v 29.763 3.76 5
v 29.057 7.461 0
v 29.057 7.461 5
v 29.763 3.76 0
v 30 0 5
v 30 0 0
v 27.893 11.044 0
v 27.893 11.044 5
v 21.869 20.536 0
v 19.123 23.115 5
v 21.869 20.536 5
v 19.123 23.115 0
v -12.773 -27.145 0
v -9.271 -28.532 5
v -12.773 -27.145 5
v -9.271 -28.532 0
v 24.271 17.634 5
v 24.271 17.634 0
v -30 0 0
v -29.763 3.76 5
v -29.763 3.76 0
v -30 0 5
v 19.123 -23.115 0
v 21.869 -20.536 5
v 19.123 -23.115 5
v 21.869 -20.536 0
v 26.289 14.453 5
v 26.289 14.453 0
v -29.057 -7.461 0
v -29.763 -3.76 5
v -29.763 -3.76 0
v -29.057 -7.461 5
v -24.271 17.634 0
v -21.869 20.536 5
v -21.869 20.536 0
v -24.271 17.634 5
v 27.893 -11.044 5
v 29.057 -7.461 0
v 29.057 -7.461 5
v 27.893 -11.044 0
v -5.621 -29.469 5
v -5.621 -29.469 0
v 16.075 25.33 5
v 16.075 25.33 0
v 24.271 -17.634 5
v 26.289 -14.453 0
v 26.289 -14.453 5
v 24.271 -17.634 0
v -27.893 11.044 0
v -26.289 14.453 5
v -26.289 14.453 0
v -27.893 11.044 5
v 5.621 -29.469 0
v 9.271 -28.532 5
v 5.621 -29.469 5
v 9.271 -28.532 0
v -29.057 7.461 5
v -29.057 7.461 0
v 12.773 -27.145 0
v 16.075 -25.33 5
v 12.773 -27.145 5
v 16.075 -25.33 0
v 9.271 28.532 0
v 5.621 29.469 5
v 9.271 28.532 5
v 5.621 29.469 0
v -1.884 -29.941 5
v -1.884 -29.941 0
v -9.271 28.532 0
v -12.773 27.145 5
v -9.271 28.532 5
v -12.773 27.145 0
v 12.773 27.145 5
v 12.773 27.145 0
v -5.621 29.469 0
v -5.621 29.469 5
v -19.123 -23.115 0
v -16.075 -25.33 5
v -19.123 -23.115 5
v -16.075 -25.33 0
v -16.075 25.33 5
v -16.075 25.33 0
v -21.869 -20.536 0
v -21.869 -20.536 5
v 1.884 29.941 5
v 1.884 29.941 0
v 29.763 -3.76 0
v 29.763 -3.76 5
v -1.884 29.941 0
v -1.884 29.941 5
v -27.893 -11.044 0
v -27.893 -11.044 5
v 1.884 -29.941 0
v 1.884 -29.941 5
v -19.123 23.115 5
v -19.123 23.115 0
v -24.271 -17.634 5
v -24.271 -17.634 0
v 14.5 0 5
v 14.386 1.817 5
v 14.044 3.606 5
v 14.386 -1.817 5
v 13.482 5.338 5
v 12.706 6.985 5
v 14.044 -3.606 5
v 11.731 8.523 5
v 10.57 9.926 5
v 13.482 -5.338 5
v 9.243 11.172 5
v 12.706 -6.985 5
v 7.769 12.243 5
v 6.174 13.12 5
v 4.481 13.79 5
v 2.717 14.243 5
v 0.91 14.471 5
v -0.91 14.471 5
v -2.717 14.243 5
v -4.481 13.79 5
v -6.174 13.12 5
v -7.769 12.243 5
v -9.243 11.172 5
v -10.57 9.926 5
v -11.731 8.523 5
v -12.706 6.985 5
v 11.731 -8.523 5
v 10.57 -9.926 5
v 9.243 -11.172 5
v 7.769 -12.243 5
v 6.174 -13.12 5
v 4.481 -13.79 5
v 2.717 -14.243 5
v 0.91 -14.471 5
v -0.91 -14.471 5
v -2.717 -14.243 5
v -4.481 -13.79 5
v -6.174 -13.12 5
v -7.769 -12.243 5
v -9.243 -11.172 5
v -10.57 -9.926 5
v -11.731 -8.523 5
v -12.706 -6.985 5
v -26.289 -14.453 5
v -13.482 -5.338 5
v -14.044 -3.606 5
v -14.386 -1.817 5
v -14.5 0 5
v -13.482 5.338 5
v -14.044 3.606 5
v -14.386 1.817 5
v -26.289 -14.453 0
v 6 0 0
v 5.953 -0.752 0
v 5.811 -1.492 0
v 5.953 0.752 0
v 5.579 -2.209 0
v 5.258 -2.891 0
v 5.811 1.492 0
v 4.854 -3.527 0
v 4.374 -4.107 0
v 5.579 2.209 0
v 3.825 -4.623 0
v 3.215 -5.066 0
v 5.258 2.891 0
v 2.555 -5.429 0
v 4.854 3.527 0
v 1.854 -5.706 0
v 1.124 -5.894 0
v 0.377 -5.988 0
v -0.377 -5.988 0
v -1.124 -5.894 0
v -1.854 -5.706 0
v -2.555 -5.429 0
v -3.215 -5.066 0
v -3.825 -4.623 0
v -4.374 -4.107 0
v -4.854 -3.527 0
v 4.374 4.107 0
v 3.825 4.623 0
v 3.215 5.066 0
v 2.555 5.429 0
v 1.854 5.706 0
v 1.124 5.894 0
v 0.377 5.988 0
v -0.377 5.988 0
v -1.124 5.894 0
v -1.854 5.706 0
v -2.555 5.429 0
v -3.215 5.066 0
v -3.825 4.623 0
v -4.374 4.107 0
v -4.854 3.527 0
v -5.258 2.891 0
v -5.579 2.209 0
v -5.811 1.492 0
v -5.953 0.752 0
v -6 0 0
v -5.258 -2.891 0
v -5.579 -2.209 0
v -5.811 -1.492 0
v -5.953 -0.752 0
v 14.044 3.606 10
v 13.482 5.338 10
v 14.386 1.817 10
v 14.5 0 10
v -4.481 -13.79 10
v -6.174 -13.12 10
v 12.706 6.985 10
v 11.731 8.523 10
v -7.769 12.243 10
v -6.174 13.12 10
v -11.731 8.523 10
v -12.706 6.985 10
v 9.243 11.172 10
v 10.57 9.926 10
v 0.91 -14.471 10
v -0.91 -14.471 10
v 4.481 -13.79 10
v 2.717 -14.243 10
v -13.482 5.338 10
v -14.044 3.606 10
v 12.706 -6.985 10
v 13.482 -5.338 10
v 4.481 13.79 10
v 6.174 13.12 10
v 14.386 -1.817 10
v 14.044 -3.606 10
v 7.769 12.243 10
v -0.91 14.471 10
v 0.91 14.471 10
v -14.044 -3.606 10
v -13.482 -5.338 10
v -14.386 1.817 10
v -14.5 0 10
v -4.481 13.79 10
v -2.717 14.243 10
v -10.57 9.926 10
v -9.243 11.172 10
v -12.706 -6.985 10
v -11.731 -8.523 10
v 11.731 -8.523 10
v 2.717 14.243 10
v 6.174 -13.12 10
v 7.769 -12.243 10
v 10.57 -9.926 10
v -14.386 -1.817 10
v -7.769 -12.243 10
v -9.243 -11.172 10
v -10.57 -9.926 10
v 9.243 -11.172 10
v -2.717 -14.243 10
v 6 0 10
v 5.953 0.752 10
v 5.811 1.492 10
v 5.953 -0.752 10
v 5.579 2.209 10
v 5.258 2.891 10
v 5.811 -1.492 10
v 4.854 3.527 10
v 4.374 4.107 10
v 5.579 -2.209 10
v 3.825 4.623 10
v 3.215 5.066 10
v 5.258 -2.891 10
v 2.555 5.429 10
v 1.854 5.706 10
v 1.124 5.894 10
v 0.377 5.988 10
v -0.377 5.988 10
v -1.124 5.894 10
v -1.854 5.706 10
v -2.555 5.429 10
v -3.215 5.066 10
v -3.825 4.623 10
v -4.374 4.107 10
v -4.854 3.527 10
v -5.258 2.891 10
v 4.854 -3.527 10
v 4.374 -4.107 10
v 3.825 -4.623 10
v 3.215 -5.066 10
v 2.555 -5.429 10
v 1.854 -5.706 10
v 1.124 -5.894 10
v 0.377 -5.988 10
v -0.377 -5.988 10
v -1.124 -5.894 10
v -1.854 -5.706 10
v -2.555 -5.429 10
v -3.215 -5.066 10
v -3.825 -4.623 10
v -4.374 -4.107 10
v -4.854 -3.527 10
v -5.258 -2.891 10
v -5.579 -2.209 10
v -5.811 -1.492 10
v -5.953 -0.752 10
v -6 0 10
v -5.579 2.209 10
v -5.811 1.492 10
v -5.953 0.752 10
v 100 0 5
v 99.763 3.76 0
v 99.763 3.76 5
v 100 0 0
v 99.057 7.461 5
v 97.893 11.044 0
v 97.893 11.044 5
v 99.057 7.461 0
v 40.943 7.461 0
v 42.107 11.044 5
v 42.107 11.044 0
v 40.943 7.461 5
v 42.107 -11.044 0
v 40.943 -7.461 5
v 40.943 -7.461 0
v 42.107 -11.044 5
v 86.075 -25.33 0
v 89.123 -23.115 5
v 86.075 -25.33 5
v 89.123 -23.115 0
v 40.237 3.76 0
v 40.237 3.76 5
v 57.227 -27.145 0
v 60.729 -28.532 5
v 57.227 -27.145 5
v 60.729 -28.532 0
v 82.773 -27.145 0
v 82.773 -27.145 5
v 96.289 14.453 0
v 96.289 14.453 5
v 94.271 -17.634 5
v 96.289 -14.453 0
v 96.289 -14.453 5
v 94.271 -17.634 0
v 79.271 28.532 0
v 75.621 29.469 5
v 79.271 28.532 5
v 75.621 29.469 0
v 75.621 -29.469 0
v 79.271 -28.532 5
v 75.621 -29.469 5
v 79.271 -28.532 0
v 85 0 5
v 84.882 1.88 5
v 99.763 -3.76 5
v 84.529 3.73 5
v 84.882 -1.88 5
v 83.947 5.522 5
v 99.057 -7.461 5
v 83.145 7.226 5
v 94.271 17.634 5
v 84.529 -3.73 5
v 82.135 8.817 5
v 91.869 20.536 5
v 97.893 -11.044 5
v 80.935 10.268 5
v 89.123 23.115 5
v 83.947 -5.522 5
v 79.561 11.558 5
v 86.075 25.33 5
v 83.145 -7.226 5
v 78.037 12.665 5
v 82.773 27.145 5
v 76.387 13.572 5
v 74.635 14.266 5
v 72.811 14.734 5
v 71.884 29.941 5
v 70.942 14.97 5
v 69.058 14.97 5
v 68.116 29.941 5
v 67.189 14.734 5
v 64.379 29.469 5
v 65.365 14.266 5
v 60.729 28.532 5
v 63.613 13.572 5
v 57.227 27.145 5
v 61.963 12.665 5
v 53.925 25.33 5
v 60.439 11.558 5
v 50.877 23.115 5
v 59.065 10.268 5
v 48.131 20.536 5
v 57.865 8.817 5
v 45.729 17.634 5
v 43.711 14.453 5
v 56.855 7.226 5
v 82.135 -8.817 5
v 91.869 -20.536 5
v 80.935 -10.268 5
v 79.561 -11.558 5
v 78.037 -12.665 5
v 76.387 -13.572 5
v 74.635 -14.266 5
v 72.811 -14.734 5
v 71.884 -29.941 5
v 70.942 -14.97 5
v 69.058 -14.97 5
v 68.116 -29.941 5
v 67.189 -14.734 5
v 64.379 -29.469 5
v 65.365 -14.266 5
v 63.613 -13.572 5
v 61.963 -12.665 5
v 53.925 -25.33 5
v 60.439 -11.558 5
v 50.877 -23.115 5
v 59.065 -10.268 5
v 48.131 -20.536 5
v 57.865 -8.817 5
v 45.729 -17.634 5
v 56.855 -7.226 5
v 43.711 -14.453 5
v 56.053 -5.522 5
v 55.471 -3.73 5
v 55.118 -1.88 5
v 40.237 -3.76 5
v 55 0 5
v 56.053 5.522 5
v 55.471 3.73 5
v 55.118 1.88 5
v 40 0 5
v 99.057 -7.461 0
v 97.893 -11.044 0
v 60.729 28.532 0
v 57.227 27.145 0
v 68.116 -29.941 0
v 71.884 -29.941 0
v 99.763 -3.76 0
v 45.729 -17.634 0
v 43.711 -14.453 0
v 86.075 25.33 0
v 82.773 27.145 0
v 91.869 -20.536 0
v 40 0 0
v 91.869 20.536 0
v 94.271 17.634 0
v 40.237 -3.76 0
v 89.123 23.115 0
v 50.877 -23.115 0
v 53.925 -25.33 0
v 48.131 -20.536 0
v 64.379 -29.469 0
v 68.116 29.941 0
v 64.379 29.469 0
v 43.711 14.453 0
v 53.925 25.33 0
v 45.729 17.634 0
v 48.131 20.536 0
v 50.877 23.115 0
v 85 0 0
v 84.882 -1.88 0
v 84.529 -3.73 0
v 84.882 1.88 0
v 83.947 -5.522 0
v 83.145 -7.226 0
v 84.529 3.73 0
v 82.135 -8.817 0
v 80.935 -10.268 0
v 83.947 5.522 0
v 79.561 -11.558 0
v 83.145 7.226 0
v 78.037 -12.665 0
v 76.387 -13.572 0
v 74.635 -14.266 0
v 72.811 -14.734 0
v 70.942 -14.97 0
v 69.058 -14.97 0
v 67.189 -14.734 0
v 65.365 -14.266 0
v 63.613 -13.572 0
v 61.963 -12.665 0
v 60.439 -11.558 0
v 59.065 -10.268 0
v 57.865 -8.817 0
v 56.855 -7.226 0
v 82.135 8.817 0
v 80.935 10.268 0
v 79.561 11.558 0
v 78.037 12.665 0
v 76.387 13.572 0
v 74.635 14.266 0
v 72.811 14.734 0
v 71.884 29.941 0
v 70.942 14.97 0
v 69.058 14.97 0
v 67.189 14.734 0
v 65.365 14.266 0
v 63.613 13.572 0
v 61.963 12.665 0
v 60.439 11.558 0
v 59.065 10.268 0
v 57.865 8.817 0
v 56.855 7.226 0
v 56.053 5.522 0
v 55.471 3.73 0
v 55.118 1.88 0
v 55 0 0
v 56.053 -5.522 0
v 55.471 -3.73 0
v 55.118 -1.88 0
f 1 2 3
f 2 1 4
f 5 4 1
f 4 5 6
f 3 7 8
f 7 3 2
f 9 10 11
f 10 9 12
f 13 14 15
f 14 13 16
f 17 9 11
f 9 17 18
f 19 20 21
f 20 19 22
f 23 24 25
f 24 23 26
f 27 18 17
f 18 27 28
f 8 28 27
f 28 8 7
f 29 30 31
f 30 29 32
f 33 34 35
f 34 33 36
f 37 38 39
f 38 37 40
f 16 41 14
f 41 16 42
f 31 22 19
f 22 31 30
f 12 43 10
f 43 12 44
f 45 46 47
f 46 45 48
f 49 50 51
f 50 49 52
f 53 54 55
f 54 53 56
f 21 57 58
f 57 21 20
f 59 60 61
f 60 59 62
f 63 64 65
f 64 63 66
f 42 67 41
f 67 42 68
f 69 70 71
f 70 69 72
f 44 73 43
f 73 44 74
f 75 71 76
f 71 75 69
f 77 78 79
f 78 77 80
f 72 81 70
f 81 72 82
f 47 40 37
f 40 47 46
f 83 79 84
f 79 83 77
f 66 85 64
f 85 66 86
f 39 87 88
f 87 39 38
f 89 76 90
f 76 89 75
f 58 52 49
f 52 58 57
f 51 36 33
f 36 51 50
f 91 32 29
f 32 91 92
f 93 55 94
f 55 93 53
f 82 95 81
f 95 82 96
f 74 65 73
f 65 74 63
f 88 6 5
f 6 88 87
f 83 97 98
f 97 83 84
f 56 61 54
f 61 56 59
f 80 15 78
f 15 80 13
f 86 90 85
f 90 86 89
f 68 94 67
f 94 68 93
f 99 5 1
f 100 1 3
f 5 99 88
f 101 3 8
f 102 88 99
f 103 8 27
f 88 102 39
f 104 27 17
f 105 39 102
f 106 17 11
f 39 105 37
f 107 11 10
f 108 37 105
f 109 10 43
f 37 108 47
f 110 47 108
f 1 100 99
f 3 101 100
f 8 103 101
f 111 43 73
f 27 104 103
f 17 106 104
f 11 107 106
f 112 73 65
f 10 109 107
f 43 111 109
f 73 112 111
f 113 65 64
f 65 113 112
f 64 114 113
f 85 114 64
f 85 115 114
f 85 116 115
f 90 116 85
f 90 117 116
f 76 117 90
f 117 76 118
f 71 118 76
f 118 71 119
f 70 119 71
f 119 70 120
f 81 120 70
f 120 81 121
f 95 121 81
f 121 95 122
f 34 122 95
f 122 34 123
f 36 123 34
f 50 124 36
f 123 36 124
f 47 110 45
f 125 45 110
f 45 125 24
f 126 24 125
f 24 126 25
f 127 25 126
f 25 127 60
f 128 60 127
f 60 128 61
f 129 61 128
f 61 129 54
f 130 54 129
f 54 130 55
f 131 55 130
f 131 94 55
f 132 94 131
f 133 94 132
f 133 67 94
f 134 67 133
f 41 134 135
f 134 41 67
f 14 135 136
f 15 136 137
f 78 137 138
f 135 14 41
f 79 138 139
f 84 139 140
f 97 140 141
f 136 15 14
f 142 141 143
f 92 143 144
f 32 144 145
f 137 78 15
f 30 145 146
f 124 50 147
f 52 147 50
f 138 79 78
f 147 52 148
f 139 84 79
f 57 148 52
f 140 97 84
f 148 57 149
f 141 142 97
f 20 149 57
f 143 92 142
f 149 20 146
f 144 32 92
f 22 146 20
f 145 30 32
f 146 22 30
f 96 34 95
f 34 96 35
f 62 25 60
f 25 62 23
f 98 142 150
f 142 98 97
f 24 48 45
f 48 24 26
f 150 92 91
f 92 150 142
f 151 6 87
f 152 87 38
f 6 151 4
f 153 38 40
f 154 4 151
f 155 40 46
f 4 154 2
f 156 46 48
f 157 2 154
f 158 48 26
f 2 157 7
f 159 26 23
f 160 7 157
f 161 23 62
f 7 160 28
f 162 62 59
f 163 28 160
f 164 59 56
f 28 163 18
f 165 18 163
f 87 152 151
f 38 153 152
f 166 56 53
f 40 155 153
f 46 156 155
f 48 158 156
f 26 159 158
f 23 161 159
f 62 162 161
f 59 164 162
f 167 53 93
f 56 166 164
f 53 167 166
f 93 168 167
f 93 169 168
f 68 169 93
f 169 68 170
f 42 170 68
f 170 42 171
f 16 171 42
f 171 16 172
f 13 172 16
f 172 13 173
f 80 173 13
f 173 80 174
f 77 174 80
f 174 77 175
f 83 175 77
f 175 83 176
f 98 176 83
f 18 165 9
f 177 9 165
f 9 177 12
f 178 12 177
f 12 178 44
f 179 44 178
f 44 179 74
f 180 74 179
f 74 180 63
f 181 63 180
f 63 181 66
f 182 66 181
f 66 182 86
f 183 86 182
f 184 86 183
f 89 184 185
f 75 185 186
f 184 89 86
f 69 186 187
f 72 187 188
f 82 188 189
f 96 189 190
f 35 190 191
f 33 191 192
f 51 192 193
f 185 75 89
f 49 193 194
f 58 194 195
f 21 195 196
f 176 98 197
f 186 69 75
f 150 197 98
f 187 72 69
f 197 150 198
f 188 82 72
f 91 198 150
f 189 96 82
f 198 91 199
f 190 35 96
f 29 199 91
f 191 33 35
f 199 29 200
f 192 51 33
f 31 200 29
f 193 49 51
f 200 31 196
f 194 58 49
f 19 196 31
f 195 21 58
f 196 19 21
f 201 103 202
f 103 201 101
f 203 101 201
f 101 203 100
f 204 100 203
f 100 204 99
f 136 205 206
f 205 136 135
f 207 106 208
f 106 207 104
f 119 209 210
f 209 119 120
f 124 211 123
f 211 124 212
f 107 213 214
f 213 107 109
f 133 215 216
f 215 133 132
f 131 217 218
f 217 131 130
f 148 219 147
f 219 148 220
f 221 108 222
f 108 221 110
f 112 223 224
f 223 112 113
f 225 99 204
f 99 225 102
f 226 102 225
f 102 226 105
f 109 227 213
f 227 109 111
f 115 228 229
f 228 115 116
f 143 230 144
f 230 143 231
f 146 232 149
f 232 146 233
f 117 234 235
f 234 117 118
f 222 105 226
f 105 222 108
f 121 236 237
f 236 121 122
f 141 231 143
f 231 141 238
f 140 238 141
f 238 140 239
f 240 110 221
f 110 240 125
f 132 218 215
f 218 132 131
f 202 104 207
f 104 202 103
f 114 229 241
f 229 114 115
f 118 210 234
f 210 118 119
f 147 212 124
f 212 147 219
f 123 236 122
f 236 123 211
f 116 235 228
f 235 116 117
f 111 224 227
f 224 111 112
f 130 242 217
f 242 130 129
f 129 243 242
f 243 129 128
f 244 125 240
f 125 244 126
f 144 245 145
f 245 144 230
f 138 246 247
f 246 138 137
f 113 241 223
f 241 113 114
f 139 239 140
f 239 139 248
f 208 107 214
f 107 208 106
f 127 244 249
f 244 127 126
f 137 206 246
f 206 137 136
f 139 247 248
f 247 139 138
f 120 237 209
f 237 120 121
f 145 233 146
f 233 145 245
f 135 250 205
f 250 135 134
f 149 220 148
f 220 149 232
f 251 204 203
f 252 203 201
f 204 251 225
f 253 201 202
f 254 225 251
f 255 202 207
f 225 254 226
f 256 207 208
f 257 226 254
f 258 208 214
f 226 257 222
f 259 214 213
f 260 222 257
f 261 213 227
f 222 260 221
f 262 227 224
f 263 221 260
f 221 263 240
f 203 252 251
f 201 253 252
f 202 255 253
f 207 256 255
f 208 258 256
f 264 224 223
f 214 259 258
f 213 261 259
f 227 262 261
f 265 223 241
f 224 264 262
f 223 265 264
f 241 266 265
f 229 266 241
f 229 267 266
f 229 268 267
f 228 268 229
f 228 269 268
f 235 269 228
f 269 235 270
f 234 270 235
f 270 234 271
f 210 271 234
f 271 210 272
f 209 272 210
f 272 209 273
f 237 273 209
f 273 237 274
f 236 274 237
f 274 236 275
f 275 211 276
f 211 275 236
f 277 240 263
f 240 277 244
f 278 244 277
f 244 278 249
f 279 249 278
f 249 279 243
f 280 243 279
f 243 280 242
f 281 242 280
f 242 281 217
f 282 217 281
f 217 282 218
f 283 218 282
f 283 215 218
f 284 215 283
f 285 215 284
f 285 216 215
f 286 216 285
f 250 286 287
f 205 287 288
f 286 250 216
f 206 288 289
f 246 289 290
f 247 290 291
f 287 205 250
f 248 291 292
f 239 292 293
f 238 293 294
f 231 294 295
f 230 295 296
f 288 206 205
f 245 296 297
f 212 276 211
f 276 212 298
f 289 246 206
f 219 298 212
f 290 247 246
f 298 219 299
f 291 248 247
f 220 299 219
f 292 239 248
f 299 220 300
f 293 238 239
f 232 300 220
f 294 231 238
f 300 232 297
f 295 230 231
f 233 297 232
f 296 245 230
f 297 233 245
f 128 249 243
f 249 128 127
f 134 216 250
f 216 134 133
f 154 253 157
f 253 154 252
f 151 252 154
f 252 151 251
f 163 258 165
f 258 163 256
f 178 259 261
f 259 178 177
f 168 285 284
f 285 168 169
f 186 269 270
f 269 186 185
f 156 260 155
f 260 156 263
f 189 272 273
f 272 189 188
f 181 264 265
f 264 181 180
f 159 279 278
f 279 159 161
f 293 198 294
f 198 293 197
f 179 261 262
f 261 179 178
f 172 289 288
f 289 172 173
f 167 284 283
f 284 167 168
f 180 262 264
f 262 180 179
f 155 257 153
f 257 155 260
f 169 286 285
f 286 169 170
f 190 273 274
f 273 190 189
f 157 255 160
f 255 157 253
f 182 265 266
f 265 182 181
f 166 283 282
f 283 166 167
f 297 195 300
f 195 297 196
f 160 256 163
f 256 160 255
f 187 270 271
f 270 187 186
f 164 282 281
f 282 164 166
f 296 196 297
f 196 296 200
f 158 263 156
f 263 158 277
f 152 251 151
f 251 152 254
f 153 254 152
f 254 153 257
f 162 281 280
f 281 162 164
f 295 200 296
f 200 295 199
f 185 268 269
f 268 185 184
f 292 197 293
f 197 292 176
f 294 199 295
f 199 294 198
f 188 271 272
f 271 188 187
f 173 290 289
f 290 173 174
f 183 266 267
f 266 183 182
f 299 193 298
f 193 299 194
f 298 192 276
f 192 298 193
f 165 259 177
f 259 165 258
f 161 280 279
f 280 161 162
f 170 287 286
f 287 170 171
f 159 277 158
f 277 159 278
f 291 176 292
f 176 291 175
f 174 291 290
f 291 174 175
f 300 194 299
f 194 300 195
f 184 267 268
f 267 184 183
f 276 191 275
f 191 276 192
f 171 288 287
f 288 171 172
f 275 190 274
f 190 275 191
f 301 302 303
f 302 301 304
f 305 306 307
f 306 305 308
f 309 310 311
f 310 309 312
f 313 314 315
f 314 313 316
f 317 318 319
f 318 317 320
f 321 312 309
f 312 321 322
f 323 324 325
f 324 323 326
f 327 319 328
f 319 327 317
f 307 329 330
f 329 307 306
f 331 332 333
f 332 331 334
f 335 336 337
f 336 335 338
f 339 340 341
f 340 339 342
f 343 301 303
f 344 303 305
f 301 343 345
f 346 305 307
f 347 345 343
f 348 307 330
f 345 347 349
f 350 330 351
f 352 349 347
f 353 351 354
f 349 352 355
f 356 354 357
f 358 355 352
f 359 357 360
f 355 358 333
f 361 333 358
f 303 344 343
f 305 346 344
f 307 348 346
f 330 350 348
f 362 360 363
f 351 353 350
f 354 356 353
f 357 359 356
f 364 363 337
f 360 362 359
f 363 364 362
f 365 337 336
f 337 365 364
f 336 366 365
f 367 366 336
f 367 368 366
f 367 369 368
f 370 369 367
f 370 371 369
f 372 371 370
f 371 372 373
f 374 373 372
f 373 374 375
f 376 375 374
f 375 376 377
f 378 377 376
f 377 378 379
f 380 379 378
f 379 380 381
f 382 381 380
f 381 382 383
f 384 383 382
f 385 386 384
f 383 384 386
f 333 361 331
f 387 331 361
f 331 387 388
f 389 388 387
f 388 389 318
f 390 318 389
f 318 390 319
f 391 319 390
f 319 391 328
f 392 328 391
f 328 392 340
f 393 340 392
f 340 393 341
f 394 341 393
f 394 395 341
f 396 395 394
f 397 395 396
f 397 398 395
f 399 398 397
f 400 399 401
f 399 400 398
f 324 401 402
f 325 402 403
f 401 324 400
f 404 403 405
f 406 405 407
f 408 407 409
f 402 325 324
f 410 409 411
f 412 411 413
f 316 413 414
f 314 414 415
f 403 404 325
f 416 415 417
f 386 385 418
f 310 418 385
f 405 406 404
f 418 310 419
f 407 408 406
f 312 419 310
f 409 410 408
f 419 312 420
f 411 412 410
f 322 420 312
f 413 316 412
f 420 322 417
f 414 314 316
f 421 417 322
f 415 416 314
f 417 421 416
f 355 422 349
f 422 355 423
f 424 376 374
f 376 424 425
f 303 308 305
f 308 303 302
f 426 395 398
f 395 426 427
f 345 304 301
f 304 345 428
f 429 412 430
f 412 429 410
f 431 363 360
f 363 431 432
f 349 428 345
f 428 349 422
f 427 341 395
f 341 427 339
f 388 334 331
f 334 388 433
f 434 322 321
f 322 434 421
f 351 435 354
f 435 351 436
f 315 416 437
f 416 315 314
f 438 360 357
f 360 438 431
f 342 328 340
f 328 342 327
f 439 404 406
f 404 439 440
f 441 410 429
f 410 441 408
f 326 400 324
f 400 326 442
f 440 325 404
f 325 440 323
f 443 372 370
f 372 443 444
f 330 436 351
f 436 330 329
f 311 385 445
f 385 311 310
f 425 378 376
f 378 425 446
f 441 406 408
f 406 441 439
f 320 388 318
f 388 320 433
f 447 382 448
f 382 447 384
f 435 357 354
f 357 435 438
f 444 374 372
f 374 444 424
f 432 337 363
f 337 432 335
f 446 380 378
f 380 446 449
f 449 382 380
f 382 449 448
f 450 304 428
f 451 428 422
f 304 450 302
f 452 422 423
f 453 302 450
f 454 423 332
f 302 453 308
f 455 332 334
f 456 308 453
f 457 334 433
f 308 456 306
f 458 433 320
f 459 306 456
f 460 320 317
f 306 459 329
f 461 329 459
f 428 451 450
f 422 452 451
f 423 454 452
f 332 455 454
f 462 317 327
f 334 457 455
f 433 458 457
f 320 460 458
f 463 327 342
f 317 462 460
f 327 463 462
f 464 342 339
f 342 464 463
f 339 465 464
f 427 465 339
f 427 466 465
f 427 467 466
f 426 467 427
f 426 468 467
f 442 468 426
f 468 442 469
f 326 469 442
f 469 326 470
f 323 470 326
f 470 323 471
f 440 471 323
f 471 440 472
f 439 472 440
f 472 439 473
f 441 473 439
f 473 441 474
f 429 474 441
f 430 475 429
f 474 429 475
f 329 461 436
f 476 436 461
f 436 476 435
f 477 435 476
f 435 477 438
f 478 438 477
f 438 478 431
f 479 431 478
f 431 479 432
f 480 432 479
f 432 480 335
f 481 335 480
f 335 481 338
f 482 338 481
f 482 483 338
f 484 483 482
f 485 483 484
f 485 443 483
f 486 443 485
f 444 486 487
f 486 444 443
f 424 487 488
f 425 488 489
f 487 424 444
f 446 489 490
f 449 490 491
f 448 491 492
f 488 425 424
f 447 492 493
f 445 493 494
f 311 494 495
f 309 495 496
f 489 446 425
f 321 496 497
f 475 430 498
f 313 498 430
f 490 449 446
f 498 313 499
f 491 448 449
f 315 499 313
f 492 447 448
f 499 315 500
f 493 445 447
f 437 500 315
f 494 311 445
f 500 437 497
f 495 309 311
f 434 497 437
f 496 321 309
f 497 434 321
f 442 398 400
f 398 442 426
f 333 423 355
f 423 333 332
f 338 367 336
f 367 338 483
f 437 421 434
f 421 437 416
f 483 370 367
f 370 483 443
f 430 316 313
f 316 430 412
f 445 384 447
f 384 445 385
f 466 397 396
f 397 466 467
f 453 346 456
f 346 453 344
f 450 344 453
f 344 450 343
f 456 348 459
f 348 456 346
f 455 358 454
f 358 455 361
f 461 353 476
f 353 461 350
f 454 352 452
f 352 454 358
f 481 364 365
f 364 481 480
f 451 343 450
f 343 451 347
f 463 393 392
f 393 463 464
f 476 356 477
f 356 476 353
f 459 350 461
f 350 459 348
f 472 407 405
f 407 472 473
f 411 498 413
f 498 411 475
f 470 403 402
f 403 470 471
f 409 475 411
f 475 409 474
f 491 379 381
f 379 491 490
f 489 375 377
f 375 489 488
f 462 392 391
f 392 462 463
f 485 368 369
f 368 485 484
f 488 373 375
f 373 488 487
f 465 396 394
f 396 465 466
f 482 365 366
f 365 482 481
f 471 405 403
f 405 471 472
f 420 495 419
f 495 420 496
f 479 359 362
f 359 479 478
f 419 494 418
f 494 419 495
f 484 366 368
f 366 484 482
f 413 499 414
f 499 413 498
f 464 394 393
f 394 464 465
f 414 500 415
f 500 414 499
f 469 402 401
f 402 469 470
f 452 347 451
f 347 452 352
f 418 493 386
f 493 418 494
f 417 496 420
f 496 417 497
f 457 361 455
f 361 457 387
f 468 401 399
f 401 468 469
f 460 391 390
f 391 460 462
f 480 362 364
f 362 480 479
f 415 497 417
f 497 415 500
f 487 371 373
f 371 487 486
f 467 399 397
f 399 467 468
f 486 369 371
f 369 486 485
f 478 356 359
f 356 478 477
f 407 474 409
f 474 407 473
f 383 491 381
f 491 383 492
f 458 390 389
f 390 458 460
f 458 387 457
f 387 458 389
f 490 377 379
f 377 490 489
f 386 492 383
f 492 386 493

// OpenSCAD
resolucion = 50; // Calidad de la circunferencia
agujero_eje = 6; // Para que pase el eje central

eje_cd = 14.5; // En él debe calzar el CD.
tapa_cd = 15; // Debe calzar en el eje_cd

difference(){
  union() {
    cylinder(h=5, r=30, $fn=resolucion);
    cylinder(h=10, r=eje_cd, $fn=resolucion);
  };
  cylinder(h=10, r=agujero_eje, $fn=resolucion);
};

translate([70, 0, 0]){
  difference(){
    cylinder(h=5, r=30, $fn=resolucion);
    cylinder(h=5, r=tapa_cd, $fn=resolucion);
  };
}
